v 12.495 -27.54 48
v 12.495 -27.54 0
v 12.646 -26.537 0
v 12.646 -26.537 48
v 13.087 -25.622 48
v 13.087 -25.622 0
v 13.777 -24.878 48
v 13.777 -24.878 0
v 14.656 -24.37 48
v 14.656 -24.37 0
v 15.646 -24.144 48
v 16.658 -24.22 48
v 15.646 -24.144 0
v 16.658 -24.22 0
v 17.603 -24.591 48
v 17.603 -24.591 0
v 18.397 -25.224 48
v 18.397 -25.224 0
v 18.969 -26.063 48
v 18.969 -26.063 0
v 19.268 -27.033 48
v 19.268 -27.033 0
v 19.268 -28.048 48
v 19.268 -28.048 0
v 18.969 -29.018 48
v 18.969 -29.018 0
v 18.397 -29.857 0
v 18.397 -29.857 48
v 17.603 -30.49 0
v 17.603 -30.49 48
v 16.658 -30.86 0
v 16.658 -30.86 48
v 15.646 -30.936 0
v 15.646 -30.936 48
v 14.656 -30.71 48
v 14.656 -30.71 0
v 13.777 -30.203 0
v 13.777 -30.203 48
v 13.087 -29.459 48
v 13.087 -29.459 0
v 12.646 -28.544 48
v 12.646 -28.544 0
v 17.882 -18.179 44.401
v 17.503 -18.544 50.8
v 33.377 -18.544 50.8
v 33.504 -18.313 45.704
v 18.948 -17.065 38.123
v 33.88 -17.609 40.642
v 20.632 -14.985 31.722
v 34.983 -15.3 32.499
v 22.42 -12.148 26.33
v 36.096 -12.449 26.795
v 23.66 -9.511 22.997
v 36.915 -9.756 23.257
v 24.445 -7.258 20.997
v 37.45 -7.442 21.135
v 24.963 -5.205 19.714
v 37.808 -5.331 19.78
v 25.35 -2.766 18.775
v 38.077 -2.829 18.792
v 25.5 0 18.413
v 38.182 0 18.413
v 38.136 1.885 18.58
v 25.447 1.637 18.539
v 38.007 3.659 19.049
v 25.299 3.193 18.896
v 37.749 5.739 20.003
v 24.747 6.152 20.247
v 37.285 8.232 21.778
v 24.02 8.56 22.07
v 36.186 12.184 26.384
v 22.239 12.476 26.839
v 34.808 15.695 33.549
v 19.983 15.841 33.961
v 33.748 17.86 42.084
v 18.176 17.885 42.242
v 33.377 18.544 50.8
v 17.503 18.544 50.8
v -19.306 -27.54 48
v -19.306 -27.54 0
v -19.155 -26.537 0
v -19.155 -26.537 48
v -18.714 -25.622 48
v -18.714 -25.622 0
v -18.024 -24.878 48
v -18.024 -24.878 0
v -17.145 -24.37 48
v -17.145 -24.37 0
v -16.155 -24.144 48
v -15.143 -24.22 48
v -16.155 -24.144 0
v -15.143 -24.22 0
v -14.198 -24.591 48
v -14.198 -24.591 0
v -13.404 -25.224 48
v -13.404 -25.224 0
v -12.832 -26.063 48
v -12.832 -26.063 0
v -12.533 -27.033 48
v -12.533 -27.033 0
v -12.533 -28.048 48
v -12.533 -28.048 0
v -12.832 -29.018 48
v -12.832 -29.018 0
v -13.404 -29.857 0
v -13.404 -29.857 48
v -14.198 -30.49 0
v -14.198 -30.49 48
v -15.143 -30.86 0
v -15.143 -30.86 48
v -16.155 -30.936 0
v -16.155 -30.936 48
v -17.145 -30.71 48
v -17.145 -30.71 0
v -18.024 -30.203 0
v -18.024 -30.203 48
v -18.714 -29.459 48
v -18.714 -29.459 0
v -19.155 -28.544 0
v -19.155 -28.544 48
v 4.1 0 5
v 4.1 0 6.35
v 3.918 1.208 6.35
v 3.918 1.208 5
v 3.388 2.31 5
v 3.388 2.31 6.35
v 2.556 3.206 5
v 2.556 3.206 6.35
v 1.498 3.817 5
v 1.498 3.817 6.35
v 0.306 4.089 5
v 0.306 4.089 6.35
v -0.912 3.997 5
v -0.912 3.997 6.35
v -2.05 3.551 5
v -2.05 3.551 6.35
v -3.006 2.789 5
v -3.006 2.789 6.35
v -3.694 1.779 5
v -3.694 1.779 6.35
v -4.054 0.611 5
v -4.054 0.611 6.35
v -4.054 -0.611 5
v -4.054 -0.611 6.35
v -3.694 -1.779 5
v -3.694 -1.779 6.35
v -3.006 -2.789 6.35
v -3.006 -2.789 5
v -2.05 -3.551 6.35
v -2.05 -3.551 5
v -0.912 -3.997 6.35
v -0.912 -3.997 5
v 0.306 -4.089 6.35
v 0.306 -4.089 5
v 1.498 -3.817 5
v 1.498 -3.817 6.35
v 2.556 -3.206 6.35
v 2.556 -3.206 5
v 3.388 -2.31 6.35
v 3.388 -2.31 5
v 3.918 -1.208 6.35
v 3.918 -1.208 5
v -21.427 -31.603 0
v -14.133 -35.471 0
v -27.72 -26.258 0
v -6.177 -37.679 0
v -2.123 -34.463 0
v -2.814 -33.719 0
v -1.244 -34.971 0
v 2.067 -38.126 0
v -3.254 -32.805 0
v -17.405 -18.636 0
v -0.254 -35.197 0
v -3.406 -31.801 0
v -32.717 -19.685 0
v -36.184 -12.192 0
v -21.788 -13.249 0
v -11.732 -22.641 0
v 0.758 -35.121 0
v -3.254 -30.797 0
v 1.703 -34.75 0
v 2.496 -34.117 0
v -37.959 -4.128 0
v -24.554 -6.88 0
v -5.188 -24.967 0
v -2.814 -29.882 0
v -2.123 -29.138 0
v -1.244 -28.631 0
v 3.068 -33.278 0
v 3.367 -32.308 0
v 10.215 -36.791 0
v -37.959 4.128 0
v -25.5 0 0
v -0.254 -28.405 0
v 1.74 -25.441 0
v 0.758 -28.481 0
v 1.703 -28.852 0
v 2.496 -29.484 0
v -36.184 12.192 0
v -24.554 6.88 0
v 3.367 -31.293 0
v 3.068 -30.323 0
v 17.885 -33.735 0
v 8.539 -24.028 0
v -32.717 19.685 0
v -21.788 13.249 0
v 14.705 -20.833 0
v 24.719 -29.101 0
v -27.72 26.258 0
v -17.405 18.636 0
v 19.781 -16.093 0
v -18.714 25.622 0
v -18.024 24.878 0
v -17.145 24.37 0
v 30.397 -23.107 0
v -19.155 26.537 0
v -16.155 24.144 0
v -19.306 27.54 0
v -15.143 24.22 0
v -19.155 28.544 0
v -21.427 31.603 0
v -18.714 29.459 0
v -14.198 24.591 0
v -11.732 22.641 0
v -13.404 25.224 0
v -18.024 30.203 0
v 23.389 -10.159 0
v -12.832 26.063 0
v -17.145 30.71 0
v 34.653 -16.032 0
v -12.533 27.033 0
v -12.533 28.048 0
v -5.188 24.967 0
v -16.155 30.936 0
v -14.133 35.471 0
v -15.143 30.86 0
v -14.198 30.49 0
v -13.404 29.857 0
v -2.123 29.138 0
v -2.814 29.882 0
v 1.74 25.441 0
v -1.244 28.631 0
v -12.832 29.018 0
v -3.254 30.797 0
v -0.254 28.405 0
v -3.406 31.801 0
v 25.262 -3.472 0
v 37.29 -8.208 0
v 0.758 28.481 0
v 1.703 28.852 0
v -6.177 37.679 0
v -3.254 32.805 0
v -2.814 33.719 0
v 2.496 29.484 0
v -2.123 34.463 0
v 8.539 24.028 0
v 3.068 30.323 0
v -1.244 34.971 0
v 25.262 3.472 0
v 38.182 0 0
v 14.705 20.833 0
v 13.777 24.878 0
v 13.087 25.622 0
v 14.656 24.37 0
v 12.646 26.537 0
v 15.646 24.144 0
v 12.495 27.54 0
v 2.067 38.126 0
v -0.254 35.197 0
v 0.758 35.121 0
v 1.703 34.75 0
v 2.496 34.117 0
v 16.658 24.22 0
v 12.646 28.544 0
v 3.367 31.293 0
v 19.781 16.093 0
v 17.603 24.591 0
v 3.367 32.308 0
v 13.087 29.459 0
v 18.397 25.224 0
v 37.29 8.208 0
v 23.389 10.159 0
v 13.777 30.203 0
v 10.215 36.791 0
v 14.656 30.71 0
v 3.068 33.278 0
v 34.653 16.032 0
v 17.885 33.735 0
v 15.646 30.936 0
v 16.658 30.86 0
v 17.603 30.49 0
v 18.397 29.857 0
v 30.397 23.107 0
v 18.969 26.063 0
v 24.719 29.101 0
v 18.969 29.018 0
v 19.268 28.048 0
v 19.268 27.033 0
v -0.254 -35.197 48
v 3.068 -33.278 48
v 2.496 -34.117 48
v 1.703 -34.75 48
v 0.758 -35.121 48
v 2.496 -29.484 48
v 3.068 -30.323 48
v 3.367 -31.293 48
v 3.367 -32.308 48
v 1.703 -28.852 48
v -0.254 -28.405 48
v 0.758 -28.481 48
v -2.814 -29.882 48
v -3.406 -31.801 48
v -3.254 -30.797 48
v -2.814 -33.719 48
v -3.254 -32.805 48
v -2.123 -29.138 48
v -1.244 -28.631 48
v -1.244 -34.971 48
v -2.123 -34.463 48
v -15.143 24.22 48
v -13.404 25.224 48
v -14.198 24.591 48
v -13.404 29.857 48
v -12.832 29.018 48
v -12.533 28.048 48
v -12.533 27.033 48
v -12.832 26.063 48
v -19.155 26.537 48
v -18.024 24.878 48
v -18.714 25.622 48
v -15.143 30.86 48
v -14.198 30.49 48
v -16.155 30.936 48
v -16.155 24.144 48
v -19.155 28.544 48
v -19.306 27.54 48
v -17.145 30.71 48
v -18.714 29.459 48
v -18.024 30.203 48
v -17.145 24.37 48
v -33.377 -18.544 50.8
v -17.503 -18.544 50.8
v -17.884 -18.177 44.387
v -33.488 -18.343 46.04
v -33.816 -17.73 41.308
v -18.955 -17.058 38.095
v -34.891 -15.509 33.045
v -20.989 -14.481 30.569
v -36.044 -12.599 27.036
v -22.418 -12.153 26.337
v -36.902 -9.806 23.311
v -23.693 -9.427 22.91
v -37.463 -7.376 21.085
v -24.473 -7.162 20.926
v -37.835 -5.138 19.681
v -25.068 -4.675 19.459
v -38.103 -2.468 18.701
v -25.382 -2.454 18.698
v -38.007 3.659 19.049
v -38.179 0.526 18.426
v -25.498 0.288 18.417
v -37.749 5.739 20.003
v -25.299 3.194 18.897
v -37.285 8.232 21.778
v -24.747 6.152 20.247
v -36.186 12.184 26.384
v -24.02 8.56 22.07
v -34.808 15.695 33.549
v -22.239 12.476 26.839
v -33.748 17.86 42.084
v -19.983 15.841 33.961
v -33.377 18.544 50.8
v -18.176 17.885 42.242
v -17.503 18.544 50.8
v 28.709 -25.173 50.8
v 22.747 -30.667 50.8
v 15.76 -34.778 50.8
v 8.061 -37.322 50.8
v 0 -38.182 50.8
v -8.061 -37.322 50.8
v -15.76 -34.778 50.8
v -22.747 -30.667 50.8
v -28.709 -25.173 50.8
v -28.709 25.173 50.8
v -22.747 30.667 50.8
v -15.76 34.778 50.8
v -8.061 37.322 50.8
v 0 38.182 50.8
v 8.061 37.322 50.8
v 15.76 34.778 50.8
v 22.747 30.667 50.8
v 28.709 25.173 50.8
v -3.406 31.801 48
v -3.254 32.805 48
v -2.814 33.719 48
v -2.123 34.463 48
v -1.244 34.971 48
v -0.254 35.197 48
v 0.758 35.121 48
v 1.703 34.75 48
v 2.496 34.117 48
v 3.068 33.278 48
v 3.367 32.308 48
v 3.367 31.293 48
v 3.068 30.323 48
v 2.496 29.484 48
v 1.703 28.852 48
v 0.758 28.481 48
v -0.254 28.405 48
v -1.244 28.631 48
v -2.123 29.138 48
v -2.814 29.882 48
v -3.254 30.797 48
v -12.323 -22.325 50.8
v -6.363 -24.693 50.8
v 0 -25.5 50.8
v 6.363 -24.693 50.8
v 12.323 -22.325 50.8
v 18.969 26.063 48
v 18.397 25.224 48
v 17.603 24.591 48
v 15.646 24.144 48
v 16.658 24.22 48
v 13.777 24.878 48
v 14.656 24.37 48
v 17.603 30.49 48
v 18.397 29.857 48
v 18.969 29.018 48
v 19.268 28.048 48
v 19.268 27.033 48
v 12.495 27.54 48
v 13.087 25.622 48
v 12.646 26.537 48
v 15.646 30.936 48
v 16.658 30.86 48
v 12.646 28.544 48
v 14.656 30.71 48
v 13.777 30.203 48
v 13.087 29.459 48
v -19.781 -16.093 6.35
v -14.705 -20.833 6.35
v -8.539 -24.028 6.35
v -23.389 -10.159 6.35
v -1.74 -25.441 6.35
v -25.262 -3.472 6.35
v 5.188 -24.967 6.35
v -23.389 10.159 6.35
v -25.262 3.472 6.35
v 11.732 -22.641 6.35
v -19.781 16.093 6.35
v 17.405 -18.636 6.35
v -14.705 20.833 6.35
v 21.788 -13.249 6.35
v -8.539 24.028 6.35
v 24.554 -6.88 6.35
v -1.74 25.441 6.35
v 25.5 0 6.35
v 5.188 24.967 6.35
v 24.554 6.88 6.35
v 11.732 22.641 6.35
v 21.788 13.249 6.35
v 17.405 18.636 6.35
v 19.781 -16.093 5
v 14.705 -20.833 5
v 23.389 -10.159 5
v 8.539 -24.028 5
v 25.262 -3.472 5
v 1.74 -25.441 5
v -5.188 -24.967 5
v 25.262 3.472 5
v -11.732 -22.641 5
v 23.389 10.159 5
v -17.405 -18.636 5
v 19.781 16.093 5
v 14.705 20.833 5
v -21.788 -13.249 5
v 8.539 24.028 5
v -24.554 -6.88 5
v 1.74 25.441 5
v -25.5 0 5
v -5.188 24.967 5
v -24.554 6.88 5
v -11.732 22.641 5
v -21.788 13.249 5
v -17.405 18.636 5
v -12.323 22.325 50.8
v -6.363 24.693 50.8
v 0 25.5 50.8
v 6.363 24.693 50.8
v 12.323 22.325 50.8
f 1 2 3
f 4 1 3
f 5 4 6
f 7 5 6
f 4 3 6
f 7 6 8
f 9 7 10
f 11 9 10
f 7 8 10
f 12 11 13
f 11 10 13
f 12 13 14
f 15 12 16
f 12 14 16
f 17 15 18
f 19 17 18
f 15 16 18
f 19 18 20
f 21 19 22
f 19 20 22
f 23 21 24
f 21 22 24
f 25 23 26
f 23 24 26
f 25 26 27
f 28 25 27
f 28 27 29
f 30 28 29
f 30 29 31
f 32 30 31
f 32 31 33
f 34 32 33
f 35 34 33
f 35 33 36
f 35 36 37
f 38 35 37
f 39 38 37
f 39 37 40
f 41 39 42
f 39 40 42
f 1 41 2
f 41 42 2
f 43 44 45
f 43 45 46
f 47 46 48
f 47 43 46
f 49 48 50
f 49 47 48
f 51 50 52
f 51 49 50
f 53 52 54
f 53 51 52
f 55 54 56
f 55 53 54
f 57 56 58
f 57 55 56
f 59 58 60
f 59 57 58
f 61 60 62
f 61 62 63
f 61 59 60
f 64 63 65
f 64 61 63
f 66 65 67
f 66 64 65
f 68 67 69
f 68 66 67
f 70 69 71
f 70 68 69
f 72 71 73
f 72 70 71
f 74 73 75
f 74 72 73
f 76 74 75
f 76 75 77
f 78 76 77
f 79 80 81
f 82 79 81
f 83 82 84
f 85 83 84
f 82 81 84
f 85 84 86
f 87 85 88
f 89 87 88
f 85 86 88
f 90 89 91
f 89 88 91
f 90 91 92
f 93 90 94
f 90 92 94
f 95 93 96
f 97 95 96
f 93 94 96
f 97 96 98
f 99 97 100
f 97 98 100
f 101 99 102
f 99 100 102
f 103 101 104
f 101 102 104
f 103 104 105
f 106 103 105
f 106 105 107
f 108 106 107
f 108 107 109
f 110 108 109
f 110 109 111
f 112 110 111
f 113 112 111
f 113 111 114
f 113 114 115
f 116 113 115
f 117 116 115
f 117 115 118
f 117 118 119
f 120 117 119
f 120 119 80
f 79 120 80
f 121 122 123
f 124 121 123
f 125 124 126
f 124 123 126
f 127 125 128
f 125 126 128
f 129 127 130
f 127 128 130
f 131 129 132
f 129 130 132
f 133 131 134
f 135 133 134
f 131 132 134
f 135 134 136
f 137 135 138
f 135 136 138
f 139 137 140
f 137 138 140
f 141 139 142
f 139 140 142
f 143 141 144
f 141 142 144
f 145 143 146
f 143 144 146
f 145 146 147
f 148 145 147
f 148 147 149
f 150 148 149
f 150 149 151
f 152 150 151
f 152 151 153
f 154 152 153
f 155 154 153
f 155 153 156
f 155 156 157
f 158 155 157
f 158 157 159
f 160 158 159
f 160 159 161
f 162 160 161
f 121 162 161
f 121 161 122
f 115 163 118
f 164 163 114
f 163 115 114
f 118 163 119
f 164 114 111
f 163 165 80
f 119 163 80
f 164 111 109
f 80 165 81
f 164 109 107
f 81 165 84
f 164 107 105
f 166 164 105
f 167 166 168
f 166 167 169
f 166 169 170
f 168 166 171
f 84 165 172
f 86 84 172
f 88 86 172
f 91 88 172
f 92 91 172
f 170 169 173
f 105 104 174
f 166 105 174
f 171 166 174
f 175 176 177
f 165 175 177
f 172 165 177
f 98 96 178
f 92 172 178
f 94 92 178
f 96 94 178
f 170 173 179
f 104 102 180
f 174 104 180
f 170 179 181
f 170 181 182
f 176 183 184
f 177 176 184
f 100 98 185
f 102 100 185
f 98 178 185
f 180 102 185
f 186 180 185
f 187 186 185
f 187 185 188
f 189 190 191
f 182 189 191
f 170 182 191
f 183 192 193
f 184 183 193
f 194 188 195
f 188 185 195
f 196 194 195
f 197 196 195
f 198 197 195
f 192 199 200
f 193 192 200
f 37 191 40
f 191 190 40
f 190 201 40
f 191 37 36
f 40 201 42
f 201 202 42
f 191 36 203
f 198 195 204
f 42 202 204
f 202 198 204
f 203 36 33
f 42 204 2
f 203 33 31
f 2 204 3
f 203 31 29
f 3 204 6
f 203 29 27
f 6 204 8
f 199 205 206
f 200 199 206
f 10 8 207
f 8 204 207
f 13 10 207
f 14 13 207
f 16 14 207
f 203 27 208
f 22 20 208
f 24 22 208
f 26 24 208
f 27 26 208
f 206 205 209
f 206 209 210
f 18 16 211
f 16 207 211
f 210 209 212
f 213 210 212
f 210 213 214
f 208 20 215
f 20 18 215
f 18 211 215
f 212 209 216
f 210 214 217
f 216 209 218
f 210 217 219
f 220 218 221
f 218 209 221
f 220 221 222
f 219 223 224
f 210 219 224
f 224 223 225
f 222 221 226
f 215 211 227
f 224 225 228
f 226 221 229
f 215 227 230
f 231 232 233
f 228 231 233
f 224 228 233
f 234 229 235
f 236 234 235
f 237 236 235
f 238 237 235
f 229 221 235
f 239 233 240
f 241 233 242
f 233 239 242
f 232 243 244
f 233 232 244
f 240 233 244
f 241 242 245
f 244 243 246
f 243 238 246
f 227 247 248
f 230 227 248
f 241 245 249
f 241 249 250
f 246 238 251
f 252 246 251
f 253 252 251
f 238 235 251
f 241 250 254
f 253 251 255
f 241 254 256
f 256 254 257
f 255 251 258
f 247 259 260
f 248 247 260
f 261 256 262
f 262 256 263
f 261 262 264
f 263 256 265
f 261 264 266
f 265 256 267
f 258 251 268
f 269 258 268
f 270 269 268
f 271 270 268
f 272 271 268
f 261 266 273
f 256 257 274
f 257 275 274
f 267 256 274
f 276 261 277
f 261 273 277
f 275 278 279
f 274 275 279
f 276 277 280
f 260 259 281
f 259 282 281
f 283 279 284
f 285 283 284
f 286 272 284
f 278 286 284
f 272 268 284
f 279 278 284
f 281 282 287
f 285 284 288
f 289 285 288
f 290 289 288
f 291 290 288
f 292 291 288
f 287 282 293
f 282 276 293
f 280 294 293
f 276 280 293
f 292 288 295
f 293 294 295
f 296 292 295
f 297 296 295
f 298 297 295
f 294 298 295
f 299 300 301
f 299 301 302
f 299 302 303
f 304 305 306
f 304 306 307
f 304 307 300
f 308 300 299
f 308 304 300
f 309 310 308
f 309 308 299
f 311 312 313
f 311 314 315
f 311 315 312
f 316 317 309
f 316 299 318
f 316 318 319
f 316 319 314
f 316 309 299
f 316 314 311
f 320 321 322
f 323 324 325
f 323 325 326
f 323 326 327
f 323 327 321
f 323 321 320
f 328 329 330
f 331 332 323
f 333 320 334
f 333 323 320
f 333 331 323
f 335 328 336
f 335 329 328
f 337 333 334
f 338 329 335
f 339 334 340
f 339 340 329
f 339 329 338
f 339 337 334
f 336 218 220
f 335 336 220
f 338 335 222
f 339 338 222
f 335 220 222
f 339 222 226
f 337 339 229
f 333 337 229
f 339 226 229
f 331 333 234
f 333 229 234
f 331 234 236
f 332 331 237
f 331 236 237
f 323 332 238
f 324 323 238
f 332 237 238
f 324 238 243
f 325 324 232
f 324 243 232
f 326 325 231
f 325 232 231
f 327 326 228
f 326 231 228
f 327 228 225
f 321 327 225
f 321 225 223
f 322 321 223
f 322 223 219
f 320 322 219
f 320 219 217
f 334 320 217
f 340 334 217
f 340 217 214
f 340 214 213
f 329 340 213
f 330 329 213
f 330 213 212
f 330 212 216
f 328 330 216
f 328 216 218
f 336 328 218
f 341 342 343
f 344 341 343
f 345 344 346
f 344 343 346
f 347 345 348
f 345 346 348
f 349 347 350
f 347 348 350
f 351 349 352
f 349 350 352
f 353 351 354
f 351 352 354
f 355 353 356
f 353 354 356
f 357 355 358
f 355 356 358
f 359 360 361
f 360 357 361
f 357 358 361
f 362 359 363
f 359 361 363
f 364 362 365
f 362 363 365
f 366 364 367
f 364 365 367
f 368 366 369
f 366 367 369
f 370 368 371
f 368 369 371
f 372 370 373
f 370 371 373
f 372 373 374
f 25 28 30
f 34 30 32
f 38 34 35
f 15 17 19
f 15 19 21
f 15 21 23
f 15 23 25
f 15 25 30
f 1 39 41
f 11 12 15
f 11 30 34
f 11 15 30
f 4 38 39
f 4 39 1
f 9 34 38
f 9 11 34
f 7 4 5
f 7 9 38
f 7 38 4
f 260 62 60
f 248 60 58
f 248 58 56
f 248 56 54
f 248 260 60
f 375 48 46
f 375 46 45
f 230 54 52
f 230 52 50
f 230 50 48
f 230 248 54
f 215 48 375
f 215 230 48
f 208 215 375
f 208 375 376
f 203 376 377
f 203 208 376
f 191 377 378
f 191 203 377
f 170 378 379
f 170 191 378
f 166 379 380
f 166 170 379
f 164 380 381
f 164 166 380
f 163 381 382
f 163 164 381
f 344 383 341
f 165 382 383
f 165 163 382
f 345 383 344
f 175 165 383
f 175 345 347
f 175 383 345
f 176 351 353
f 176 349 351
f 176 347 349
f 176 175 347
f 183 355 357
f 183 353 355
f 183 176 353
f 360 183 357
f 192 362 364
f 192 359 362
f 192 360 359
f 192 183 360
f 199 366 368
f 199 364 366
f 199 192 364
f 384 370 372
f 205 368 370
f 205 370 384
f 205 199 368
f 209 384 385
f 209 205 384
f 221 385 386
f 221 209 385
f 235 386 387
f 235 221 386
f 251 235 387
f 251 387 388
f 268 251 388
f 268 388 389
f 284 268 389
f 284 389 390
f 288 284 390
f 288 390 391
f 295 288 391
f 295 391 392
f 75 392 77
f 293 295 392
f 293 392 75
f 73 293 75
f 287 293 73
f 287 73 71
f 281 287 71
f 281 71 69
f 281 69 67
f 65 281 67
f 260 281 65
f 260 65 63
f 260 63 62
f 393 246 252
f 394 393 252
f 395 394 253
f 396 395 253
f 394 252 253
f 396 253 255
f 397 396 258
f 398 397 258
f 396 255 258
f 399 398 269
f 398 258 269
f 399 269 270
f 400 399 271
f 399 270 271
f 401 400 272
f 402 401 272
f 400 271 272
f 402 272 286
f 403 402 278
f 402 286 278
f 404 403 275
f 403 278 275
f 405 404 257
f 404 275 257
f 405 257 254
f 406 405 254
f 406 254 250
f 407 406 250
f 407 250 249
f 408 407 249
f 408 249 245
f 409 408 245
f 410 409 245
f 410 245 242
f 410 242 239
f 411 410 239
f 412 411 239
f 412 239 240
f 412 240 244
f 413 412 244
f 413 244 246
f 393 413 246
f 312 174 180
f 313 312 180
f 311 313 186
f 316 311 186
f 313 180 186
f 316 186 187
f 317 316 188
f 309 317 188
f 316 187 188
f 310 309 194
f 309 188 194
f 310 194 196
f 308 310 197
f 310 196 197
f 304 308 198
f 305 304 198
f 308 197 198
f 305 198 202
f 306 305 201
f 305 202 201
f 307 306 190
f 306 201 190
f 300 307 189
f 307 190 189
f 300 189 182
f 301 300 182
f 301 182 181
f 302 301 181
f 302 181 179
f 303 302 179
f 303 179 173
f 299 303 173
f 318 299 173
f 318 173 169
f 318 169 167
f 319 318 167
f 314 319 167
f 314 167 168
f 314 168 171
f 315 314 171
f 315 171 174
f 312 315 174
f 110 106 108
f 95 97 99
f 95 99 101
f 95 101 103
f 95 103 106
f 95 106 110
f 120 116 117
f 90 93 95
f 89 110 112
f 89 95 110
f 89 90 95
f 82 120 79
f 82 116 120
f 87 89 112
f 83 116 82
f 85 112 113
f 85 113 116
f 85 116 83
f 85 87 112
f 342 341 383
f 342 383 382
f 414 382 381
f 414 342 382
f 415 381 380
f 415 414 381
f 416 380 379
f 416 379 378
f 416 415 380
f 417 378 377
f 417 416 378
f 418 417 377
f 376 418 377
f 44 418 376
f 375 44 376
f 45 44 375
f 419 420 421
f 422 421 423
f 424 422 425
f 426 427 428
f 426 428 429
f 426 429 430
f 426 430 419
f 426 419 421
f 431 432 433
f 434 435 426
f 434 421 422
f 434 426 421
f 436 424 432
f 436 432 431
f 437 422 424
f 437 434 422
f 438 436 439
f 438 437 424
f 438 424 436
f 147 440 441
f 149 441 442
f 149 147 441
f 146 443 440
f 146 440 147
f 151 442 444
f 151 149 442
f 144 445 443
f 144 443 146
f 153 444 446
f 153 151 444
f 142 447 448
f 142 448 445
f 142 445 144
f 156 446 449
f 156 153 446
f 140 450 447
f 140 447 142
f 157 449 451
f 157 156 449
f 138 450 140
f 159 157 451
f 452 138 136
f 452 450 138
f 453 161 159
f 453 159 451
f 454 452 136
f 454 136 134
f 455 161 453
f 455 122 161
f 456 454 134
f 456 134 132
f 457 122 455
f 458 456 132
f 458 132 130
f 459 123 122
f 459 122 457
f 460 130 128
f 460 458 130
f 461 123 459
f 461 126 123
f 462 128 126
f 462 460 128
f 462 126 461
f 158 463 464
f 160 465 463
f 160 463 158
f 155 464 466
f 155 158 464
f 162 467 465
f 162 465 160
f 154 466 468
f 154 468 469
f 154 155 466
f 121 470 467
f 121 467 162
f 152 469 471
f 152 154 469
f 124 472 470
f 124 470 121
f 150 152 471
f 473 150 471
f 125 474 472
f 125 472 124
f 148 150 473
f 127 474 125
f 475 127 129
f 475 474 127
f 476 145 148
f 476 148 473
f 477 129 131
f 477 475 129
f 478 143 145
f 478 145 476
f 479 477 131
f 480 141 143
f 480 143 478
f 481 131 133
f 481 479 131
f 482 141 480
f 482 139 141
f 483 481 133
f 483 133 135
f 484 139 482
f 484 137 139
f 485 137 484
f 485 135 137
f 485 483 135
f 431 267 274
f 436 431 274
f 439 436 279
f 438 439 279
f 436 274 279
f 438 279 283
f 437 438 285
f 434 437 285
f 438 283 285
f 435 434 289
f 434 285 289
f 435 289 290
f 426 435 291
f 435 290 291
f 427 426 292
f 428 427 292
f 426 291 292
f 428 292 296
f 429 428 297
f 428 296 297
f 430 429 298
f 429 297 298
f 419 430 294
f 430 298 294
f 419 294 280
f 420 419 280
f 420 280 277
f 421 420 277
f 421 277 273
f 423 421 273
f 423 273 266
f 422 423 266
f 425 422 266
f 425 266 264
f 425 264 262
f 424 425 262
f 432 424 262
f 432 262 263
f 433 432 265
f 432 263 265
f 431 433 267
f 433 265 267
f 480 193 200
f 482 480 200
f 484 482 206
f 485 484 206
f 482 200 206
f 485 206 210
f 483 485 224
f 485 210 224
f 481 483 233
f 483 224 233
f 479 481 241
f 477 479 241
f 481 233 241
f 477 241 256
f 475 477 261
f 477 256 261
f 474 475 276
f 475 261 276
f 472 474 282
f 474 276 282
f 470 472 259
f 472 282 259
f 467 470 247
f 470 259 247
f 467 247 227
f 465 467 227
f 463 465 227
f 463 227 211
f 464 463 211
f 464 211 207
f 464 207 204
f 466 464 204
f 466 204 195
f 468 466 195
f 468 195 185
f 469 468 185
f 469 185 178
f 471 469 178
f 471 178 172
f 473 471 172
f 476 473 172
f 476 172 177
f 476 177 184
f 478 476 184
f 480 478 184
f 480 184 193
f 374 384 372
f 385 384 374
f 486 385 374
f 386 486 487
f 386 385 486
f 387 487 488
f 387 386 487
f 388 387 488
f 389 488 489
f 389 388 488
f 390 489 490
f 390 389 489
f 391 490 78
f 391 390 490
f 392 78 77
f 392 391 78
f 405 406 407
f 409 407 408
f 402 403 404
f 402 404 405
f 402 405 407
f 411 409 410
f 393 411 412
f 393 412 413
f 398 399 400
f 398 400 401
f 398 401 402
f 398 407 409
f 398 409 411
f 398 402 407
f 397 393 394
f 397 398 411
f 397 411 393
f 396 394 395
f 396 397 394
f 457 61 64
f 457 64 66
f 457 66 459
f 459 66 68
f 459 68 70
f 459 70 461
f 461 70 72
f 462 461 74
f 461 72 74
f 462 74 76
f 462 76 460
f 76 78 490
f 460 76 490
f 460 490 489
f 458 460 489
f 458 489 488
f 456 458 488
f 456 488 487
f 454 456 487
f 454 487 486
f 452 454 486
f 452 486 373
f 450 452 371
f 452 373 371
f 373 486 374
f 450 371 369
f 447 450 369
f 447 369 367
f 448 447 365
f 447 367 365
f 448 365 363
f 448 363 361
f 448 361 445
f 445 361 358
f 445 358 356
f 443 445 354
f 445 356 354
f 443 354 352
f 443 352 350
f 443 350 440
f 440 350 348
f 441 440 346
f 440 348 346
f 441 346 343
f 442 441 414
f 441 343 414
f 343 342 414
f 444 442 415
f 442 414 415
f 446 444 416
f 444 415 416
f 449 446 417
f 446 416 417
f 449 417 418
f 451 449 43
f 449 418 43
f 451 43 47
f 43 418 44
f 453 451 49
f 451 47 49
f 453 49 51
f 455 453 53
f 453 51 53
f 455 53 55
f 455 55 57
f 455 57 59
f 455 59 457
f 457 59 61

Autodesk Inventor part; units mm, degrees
ref_plane "YZ Plane" through (0, 0, 0) normal (1, 0, 0) x (0, 1, 0)
ref_plane "XZ Plane" through (0, 0, 0) normal (0, 1, 0) x (-1, 0, 0)
ref_plane "XY Plane" through (0, 0, 0) normal (0, 0, 1) x (1, 0, 0)
sketch "Sketch1" plane through (0, 0, 0) normal (0, 0, 1) x (1, 0, 0)
  circle A0 centre (0, 0) radius 38.1824
extrude "Extrusion1" add sketch "Sketch1" along normal blind 50.8
sketch "Sketch2" plane through (0, 0, 0) normal (0, 0, -1) x (-1, 0, 0)
  line L0 (-10.125, -10.125) -> (10.125, -10.125) projected
  line L1 (-10.125, 10.125) -> (-10.125, -10.125) projected
  line L2 (10.125, 10.125) -> (-10.125, 10.125) projected
  line L3 (10.125, -10.125) -> (10.125, 10.125) projected
  circle A0 centre (0, 0) radius 25.4 projected
  circle A1 centre (0, 0) radius 25.5
  dimension "d22" = 51
  dimension "d23" = 50.8
extrude "Extrusion2" cut sketch "Sketch2" against normal blind 5 contours L1 L2 L3 L0 | A0 | A1
sketch "Sketch4" plane through (0, 0, 50.8) normal (0, 0, 1) x (1, 0, 0)
  circle A0 centre (0, 0) radius 25.5 projected
  circle A1 centre (0, 0) radius 25.5
extrude "Extrusion4" cut sketch "Sketch4" against normal blind 44.45
ref_plane "Work Plane1" through (0, 10, -2.54) normal (1, 0, 0) x (0, -1, 0)
sketch "Sketch5" plane through (0, 10, -2.54) normal (1, 0, 0) x (0, -1, 0)
  line L0 (-28.1824, -53.34) -> (48.1824, -53.34) projected
  ellipse E0 centre (10, -53.34) end of major axis (28.5443, -53.34) minor radius 32.3873 (28.5443, -53.34) -> (-8.5443, -53.34) ccw
  point P0 (10, -2.54)
extrude "Extrusion5" cut sketch "Sketch5" along normal through all both and the other way through all
sketch "Sketch6" plane through (0, 10, -2.54) normal (1, 0, 0) x (0, -1, 0)
  point P0 (10, -2.54)
sketch "Sketch7" plane through (0, 0, 6.35) normal (0, 0, 1) x (1, 0, 0)
  circle A0 centre (0, 0) radius 3.975 projected
  circle A1 centre (0, 0) radius 4.1
  dimension "d12" = 8.2
extrude "Extrusion6" cut sketch "Sketch7" against normal blind 10 contours A0 | A1
sketch "Sketch8" plane through (0, 0, 0) normal (0, 0, -1) x (-1, 0, 0)
  circle A0 centre (0, 0) radius 25.4 projected
  line L0 (-17.5031, 18.5443) -> (-33.3767, 18.5443) projected
  line L1 (-33.3767, -18.5443) -> (-17.5031, -18.5443) projected
  line L2 (17.5031, -18.5443) -> (33.3767, -18.5443) projected
  line L3 (33.3767, 18.5443) -> (17.5031, 18.5443) projected
  circle A1 centre (0, 31.8008) radius 3.4055
  circle A2 centre (-15.9004, 27.5403) radius 3.4055
  circle A3 centre (-27.5403, 15.9004) radius 3.4055
  circle A4 centre (-31.8008, 0) radius 3.4055
  circle A5 centre (-27.5403, -15.9004) radius 3.4055
  circle A6 centre (-15.9004, -27.5403) radius 3.4055
  circle A7 centre (0, -31.8008) radius 3.4055
  circle A8 centre (15.9004, -27.5403) radius 3.4055
  circle A9 centre (27.5403, -15.9004) radius 3.4055
  circle A10 centre (31.8008, 0) radius 3.4055
  circle A11 centre (27.5403, 15.9004) radius 3.4055
  circle A12 centre (15.9004, 27.5403) radius 3.4055
  dimension "d15" = 6.811
  dimension "d18" = 360
sketch "Sketch9" plane through (0, 0, 0) normal (0, 0, -1) x (-1, 0, 0)
  circle A0 centre (0, 31.8008) radius 3.4055 projected
  circle A1 centre (15.9004, 27.5403) radius 3.4055 projected
  circle A2 centre (-15.9004, 27.5403) radius 3.4055 projected
  circle A3 centre (-15.9004, -27.5403) radius 3.4055 projected
  circle A4 centre (0, -31.8008) radius 3.4055 projected
  circle A5 centre (15.9004, -27.5403) radius 3.4055 projected
  circle A6 centre (0, 31.8008) radius 3.4055
  circle A7 centre (15.9004, 27.5403) radius 3.4055
  circle A8 centre (-15.9004, 27.5403) radius 3.4055
  circle A9 centre (-15.9004, -27.5403) radius 3.4055
  circle A10 centre (0, -31.8008) radius 3.4055
  circle A11 centre (15.9004, -27.5403) radius 3.4055
  point P0 (0, 0)
extrude "Extrusion7" cut sketch "Sketch8" against normal blind 48 contours A1 | A2 | A6 | A7 | A8 | A12
properties part number "Launchpad"
